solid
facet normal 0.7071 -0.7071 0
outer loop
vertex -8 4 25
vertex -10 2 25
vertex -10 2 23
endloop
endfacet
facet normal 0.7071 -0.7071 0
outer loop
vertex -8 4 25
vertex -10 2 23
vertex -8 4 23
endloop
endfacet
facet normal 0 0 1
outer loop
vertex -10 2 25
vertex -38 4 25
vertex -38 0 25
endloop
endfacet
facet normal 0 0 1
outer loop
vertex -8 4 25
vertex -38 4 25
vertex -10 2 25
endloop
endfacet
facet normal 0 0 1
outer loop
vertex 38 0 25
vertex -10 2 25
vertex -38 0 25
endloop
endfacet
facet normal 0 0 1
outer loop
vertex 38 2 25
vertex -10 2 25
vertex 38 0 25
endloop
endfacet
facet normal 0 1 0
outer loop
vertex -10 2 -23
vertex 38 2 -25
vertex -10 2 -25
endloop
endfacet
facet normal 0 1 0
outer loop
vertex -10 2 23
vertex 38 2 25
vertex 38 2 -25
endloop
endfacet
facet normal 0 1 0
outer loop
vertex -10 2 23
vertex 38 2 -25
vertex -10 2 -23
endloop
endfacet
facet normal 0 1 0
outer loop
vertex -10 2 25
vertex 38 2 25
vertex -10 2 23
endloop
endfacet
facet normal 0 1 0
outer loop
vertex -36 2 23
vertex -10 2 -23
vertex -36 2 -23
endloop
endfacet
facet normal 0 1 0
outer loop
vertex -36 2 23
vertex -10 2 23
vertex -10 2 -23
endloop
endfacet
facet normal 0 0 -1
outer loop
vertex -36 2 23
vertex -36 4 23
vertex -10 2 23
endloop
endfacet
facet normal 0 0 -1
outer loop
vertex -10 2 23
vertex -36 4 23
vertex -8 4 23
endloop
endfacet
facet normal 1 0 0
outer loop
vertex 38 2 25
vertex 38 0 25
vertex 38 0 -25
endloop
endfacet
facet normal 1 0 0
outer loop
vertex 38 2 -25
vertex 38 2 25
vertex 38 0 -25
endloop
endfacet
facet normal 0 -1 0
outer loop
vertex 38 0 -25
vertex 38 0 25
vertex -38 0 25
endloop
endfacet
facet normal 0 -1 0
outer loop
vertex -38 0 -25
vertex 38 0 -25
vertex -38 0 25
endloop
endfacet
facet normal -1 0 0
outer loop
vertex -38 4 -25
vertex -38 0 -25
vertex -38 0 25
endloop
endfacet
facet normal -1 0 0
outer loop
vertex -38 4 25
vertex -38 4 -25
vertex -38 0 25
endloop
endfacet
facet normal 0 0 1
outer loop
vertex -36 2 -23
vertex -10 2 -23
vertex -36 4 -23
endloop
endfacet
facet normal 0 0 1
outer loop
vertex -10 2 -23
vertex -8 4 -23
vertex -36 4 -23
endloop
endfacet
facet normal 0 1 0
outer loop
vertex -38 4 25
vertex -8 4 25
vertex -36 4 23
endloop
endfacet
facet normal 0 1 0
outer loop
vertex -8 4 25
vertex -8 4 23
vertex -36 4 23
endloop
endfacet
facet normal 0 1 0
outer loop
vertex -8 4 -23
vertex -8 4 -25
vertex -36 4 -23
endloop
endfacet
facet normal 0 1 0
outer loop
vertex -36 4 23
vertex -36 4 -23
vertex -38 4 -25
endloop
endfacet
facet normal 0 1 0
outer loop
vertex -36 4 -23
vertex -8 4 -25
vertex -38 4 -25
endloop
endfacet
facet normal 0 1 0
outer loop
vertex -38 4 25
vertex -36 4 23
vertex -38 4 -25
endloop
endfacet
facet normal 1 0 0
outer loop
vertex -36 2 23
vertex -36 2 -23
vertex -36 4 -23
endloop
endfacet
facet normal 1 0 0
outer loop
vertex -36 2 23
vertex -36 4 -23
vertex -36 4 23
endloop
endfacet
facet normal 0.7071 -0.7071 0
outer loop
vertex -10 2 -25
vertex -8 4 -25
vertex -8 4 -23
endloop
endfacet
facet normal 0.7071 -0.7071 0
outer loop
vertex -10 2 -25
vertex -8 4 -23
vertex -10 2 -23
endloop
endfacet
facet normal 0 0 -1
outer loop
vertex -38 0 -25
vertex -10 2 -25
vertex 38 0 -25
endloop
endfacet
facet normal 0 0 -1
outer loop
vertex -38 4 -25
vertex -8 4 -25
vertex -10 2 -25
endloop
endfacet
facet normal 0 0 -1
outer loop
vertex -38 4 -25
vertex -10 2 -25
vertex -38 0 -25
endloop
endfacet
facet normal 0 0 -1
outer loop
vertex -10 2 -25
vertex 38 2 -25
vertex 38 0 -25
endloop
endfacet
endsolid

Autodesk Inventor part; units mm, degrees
ref_plane "YZ Plane" through (0, 0, 0) normal (1, 0, 0) x (0, 1, 0)
ref_plane "XZ Plane" through (0, 0, 0) normal (0, 1, 0) x (-1, 0, 0)
ref_plane "XY Plane" through (0, 0, 0) normal (0, 0, 1) x (1, 0, 0)
sketch "Boceto1" plane through (0, 0, 0) normal (0, 1, 0) x (-1, 0, 0)
  line L0 (-38, -25) -> (38, -25)
  line L1 (38, -25) -> (38, 25)
  line L2 (38, 25) -> (-38, 25)
  line L3 (-38, 25) -> (-38, -25)
  line L4 (-38, -25) -> (38, 25) construction
  line L5 (38, -25) -> (-38, 25) construction
  point P0 (0, 0)
  dimension "d0" = 76
  dimension "d1" = 50
extrude "Extrusión1" add sketch "Boceto1" along normal blind 2
sketch "Boceto2" plane through (0, 2, 0) normal (0, 1, 0) x (1, 0, 0)
  line L0 (38, 25) -> (-38, 25) projected
  line L1 (-38, -25) -> (-10, -25)
  line L2 (-38, -25) -> (38, -25) projected
  line L3 (-38, -25) -> (-38, 25)
  line L4 (-38, 25) -> (-10, 25)
  line L5 (-10, 23) -> (-36, 23)
  line L6 (-36, 23) -> (-36, -23)
  line L7 (-36, -23) -> (-10, -23)
  line L8 (-10, 25) -> (-10, 23)
  line L9 (-10, -23) -> (-10, -25)
  point P0 (0, 0)
  point P1 (0, 25)
  dimension "d14" = 2
extrude "Extrusión4" add sketch "Boceto2" along normal blind 2
sketch "Boceto5" plane through (-38, 0, 25) normal (0, 0, 1) x (1, 0, 0)
  line L0 (28, 2) -> (28, 4) projected
  line L1 (28, 4) -> (28, 2)
  line L2 (76, 2) -> (28, 2) projected
  line L3 (28, 2) -> (30, 4)
  line L4 (28, 2) -> (32.2548, 2) construction
  line L5 (28, 4) -> (30, 4)
  point P0 (38, 0)
extrude "Extrusión5" add sketch "Boceto5" against normal blind 2
mirror "Simetría2" about plane through (0, 0, 0) normal (0, 0, 1) of "Extrusión5"
properties part number "Mirror"
